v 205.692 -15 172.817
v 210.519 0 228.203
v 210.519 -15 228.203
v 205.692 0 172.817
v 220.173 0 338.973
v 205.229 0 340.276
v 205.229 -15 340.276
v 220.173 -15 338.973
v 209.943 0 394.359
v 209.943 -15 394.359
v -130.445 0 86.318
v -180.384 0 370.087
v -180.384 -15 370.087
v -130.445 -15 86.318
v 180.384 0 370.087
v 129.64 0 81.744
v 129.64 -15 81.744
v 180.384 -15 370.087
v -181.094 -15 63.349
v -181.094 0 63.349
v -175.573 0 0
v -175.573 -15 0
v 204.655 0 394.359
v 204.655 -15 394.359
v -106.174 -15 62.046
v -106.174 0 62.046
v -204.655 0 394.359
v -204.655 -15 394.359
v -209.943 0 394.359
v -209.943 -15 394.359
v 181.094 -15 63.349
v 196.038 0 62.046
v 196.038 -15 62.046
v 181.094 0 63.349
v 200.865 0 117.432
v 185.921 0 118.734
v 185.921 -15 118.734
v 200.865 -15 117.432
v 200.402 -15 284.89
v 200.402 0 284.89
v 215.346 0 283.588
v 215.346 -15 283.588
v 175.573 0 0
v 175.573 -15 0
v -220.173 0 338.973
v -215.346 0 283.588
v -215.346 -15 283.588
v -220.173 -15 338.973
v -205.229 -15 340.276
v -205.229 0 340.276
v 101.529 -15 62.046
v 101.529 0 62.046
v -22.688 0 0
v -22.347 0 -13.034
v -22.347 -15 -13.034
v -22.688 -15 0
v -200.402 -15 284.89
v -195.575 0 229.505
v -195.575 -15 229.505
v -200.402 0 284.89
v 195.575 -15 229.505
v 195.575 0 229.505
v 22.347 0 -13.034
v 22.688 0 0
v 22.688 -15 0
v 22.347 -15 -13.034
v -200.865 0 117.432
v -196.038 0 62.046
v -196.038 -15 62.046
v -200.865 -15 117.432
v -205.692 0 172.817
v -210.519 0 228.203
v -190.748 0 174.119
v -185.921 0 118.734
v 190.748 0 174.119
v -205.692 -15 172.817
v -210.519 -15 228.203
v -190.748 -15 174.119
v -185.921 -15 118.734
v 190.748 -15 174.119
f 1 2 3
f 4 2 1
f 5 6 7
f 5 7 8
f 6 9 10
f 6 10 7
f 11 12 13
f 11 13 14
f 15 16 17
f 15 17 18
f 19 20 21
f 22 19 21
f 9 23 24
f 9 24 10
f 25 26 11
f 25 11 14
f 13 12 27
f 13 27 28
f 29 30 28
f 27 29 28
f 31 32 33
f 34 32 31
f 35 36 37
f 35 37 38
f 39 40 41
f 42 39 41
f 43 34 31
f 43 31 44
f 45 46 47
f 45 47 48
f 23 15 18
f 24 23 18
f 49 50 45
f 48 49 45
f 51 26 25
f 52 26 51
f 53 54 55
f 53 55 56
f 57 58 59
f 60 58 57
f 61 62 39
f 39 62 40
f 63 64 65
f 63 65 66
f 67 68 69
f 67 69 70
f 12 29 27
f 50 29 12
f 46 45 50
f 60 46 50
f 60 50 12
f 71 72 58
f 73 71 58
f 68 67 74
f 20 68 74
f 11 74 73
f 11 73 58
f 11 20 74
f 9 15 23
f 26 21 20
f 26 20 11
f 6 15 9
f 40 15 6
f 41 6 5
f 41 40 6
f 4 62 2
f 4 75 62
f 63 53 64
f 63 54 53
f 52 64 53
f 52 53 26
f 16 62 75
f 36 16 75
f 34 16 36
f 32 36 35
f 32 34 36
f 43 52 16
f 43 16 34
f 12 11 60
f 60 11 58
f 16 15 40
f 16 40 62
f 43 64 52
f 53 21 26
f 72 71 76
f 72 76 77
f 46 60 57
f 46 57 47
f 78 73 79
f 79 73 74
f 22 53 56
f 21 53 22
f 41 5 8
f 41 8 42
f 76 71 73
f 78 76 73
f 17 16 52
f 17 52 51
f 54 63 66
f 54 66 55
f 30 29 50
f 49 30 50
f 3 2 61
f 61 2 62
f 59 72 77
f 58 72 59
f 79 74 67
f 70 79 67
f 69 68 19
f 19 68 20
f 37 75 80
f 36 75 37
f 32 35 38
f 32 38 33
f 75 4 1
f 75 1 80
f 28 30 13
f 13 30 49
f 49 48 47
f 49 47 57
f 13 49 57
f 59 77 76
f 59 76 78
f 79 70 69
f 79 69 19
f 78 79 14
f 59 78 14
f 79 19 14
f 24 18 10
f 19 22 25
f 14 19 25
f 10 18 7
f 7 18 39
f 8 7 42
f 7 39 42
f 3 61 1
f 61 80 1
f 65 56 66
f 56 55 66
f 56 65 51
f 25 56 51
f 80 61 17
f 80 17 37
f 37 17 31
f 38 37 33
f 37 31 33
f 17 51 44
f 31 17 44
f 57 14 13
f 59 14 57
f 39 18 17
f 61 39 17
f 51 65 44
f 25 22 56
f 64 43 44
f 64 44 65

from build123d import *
from OCP.BRepFilletAPI import BRepFilletAPI_MakeChamfer

# Parameters (mm, degrees)
BOSS_EXTRUDE1_DEPTH = 15
CHAMFER1_SIZE       = 20
CHAMFER1_SIZE2      = 24.644345169
CHAMFER2_SIZE       = 20
CHAMFER2_SIZE2      = 24.644345169
CUT_EXTRUDE1_DEPTH  = 455.278391079
BOSS_EXTRUDE2_DEPTH = 15


with BuildPart() as part:
    # Sketch2 → Boss-Extrude1 (new body)
    with BuildSketch(Plane(origin=(0, 0, 0), x_dir=(1, 0, 0), z_dir=(0, 1, 0))):
        Polygon((-190.630365757, 0), (-225, -394.358791714), (-184.655281407, -394.358791714), (-126.173678801, -62.046246538), (126.173678801, -62.046246538), (184.655281407, -394.358791714), (225, -394.358791714), (190.630365757, 0), align=None)
    extrude(amount=-BOSS_EXTRUDE1_DEPTH)

    # Chamfer1: one chamfer whose edges measure the first distance from different faces: ONE call of the kernel's chamfer builder (chamfer() names one face for all edges)
    chamfer1_edges_1 = [part.edges().sort_by_distance(p)[0] for p in [
        (184.655281407, -7.5, 394.358791714),
    ]]
    chamfer1_side_1 = [part.faces().sort_by_distance(p)[0] for p in [
        (204.827640703, -7.5, 394.358791714),
    ]]
    chamfer1_edges_2 = [part.edges().sort_by_distance(p)[0] for p in [
        (-184.655281407, -7.5, 394.358791714),
    ]]
    chamfer1_side_2 = [part.faces().sort_by_distance(p)[0] for p in [
        (-204.827640703, -7.5, 394.358791714),
    ]]
    chamfer1 = BRepFilletAPI_MakeChamfer(part.part.solid().wrapped)
    for e in chamfer1_edges_1:
        chamfer1.Add(CHAMFER1_SIZE, CHAMFER1_SIZE2, e.wrapped, chamfer1_side_1[0].wrapped)  # the first distance lies on this face
    for e in chamfer1_edges_2:
        chamfer1.Add(CHAMFER1_SIZE, CHAMFER1_SIZE2, e.wrapped, chamfer1_side_2[0].wrapped)  # the first distance lies on this face
    add(Compound.cast(chamfer1.Shape()), mode=Mode.REPLACE)

    # Chamfer2: one chamfer whose edges measure the first distance from different faces: ONE call of the kernel's chamfer builder (chamfer() names one face for all edges)
    chamfer2_edges_1 = [part.edges().sort_by_distance(p)[0] for p in [
        (126.173678801, -7.5, 62.046246538),
    ]]
    chamfer2_side_1 = [part.faces().sort_by_distance(p)[0] for p in [
        (153.278797334, -7.5, 216.066836355),
    ]]
    chamfer2_edges_2 = [part.edges().sort_by_distance(p)[0] for p in [
        (-126.173678801, -7.5, 62.046246538),
    ]]
    chamfer2_side_2 = [part.faces().sort_by_distance(p)[0] for p in [
        (0, -7.5, 62.046246538),
    ]]
    chamfer2 = BRepFilletAPI_MakeChamfer(part.part.solid().wrapped)
    for e in chamfer2_edges_1:
        chamfer2.Add(CHAMFER2_SIZE, CHAMFER2_SIZE2, e.wrapped, chamfer2_side_1[0].wrapped)  # the first distance lies on this face
    for e in chamfer2_edges_2:
        chamfer2.Add(CHAMFER2_SIZE, CHAMFER2_SIZE2, e.wrapped, chamfer2_side_2[0].wrapped)  # the first distance lies on this face
    add(Compound.cast(chamfer2.Shape()), mode=Mode.REPLACE)

    # Sketch3 → Cut-Extrude1 (cut, through all)
    with BuildSketch(Plane(origin=(0, 0, 0), x_dir=(1, 0, 0), z_dir=(0, 1, 0))):
        Polygon((-196.037895257, -62.046246538), (-181.094105963, -63.348645731), (-175.573068194, 0), (-190.630365757, 0), align=None)
        Polygon((-210.518947628, -228.202519126), (-195.575158335, -229.504918319), (-200.402175792, -284.890342515), (-215.345965086, -283.587943322), align=None)
        Polygon((-220.172982543, -338.973367518), (-225, -394.358791714), (-209.942702437, -394.358791714), (-205.229193249, -340.275766711), align=None)
        Polygon((-200.864912714, -117.431670734), (-205.691930171, -172.81709493), (-190.748140877, -174.119494123), (-185.92112342, -118.734069927), align=None)
    cut_extrude1 = extrude(amount=-CUT_EXTRUDE1_DEPTH, mode=Mode.SUBTRACT)

    # Mirror1: Cut-Extrude1 across plane
    add(cut_extrude1.mirror(Plane(origin=(0, 0, 0), x_dir=(0, 0, 1), z_dir=(1, 0, 0))), mode=Mode.SUBTRACT)

    # Sketch5 → Boss-Extrude2 (add)
    with BuildSketch(Plane(origin=(0, 0, 0), x_dir=(1, 0, 0), z_dir=(0, 1, 0))):
        Polygon((-22.687908556, 0), (22.687908556, 0), (22.346610744, 13.033637599), (-22.346610744, 13.033637599), align=None)
    extrude(amount=-BOSS_EXTRUDE2_DEPTH)


solid = part.part
